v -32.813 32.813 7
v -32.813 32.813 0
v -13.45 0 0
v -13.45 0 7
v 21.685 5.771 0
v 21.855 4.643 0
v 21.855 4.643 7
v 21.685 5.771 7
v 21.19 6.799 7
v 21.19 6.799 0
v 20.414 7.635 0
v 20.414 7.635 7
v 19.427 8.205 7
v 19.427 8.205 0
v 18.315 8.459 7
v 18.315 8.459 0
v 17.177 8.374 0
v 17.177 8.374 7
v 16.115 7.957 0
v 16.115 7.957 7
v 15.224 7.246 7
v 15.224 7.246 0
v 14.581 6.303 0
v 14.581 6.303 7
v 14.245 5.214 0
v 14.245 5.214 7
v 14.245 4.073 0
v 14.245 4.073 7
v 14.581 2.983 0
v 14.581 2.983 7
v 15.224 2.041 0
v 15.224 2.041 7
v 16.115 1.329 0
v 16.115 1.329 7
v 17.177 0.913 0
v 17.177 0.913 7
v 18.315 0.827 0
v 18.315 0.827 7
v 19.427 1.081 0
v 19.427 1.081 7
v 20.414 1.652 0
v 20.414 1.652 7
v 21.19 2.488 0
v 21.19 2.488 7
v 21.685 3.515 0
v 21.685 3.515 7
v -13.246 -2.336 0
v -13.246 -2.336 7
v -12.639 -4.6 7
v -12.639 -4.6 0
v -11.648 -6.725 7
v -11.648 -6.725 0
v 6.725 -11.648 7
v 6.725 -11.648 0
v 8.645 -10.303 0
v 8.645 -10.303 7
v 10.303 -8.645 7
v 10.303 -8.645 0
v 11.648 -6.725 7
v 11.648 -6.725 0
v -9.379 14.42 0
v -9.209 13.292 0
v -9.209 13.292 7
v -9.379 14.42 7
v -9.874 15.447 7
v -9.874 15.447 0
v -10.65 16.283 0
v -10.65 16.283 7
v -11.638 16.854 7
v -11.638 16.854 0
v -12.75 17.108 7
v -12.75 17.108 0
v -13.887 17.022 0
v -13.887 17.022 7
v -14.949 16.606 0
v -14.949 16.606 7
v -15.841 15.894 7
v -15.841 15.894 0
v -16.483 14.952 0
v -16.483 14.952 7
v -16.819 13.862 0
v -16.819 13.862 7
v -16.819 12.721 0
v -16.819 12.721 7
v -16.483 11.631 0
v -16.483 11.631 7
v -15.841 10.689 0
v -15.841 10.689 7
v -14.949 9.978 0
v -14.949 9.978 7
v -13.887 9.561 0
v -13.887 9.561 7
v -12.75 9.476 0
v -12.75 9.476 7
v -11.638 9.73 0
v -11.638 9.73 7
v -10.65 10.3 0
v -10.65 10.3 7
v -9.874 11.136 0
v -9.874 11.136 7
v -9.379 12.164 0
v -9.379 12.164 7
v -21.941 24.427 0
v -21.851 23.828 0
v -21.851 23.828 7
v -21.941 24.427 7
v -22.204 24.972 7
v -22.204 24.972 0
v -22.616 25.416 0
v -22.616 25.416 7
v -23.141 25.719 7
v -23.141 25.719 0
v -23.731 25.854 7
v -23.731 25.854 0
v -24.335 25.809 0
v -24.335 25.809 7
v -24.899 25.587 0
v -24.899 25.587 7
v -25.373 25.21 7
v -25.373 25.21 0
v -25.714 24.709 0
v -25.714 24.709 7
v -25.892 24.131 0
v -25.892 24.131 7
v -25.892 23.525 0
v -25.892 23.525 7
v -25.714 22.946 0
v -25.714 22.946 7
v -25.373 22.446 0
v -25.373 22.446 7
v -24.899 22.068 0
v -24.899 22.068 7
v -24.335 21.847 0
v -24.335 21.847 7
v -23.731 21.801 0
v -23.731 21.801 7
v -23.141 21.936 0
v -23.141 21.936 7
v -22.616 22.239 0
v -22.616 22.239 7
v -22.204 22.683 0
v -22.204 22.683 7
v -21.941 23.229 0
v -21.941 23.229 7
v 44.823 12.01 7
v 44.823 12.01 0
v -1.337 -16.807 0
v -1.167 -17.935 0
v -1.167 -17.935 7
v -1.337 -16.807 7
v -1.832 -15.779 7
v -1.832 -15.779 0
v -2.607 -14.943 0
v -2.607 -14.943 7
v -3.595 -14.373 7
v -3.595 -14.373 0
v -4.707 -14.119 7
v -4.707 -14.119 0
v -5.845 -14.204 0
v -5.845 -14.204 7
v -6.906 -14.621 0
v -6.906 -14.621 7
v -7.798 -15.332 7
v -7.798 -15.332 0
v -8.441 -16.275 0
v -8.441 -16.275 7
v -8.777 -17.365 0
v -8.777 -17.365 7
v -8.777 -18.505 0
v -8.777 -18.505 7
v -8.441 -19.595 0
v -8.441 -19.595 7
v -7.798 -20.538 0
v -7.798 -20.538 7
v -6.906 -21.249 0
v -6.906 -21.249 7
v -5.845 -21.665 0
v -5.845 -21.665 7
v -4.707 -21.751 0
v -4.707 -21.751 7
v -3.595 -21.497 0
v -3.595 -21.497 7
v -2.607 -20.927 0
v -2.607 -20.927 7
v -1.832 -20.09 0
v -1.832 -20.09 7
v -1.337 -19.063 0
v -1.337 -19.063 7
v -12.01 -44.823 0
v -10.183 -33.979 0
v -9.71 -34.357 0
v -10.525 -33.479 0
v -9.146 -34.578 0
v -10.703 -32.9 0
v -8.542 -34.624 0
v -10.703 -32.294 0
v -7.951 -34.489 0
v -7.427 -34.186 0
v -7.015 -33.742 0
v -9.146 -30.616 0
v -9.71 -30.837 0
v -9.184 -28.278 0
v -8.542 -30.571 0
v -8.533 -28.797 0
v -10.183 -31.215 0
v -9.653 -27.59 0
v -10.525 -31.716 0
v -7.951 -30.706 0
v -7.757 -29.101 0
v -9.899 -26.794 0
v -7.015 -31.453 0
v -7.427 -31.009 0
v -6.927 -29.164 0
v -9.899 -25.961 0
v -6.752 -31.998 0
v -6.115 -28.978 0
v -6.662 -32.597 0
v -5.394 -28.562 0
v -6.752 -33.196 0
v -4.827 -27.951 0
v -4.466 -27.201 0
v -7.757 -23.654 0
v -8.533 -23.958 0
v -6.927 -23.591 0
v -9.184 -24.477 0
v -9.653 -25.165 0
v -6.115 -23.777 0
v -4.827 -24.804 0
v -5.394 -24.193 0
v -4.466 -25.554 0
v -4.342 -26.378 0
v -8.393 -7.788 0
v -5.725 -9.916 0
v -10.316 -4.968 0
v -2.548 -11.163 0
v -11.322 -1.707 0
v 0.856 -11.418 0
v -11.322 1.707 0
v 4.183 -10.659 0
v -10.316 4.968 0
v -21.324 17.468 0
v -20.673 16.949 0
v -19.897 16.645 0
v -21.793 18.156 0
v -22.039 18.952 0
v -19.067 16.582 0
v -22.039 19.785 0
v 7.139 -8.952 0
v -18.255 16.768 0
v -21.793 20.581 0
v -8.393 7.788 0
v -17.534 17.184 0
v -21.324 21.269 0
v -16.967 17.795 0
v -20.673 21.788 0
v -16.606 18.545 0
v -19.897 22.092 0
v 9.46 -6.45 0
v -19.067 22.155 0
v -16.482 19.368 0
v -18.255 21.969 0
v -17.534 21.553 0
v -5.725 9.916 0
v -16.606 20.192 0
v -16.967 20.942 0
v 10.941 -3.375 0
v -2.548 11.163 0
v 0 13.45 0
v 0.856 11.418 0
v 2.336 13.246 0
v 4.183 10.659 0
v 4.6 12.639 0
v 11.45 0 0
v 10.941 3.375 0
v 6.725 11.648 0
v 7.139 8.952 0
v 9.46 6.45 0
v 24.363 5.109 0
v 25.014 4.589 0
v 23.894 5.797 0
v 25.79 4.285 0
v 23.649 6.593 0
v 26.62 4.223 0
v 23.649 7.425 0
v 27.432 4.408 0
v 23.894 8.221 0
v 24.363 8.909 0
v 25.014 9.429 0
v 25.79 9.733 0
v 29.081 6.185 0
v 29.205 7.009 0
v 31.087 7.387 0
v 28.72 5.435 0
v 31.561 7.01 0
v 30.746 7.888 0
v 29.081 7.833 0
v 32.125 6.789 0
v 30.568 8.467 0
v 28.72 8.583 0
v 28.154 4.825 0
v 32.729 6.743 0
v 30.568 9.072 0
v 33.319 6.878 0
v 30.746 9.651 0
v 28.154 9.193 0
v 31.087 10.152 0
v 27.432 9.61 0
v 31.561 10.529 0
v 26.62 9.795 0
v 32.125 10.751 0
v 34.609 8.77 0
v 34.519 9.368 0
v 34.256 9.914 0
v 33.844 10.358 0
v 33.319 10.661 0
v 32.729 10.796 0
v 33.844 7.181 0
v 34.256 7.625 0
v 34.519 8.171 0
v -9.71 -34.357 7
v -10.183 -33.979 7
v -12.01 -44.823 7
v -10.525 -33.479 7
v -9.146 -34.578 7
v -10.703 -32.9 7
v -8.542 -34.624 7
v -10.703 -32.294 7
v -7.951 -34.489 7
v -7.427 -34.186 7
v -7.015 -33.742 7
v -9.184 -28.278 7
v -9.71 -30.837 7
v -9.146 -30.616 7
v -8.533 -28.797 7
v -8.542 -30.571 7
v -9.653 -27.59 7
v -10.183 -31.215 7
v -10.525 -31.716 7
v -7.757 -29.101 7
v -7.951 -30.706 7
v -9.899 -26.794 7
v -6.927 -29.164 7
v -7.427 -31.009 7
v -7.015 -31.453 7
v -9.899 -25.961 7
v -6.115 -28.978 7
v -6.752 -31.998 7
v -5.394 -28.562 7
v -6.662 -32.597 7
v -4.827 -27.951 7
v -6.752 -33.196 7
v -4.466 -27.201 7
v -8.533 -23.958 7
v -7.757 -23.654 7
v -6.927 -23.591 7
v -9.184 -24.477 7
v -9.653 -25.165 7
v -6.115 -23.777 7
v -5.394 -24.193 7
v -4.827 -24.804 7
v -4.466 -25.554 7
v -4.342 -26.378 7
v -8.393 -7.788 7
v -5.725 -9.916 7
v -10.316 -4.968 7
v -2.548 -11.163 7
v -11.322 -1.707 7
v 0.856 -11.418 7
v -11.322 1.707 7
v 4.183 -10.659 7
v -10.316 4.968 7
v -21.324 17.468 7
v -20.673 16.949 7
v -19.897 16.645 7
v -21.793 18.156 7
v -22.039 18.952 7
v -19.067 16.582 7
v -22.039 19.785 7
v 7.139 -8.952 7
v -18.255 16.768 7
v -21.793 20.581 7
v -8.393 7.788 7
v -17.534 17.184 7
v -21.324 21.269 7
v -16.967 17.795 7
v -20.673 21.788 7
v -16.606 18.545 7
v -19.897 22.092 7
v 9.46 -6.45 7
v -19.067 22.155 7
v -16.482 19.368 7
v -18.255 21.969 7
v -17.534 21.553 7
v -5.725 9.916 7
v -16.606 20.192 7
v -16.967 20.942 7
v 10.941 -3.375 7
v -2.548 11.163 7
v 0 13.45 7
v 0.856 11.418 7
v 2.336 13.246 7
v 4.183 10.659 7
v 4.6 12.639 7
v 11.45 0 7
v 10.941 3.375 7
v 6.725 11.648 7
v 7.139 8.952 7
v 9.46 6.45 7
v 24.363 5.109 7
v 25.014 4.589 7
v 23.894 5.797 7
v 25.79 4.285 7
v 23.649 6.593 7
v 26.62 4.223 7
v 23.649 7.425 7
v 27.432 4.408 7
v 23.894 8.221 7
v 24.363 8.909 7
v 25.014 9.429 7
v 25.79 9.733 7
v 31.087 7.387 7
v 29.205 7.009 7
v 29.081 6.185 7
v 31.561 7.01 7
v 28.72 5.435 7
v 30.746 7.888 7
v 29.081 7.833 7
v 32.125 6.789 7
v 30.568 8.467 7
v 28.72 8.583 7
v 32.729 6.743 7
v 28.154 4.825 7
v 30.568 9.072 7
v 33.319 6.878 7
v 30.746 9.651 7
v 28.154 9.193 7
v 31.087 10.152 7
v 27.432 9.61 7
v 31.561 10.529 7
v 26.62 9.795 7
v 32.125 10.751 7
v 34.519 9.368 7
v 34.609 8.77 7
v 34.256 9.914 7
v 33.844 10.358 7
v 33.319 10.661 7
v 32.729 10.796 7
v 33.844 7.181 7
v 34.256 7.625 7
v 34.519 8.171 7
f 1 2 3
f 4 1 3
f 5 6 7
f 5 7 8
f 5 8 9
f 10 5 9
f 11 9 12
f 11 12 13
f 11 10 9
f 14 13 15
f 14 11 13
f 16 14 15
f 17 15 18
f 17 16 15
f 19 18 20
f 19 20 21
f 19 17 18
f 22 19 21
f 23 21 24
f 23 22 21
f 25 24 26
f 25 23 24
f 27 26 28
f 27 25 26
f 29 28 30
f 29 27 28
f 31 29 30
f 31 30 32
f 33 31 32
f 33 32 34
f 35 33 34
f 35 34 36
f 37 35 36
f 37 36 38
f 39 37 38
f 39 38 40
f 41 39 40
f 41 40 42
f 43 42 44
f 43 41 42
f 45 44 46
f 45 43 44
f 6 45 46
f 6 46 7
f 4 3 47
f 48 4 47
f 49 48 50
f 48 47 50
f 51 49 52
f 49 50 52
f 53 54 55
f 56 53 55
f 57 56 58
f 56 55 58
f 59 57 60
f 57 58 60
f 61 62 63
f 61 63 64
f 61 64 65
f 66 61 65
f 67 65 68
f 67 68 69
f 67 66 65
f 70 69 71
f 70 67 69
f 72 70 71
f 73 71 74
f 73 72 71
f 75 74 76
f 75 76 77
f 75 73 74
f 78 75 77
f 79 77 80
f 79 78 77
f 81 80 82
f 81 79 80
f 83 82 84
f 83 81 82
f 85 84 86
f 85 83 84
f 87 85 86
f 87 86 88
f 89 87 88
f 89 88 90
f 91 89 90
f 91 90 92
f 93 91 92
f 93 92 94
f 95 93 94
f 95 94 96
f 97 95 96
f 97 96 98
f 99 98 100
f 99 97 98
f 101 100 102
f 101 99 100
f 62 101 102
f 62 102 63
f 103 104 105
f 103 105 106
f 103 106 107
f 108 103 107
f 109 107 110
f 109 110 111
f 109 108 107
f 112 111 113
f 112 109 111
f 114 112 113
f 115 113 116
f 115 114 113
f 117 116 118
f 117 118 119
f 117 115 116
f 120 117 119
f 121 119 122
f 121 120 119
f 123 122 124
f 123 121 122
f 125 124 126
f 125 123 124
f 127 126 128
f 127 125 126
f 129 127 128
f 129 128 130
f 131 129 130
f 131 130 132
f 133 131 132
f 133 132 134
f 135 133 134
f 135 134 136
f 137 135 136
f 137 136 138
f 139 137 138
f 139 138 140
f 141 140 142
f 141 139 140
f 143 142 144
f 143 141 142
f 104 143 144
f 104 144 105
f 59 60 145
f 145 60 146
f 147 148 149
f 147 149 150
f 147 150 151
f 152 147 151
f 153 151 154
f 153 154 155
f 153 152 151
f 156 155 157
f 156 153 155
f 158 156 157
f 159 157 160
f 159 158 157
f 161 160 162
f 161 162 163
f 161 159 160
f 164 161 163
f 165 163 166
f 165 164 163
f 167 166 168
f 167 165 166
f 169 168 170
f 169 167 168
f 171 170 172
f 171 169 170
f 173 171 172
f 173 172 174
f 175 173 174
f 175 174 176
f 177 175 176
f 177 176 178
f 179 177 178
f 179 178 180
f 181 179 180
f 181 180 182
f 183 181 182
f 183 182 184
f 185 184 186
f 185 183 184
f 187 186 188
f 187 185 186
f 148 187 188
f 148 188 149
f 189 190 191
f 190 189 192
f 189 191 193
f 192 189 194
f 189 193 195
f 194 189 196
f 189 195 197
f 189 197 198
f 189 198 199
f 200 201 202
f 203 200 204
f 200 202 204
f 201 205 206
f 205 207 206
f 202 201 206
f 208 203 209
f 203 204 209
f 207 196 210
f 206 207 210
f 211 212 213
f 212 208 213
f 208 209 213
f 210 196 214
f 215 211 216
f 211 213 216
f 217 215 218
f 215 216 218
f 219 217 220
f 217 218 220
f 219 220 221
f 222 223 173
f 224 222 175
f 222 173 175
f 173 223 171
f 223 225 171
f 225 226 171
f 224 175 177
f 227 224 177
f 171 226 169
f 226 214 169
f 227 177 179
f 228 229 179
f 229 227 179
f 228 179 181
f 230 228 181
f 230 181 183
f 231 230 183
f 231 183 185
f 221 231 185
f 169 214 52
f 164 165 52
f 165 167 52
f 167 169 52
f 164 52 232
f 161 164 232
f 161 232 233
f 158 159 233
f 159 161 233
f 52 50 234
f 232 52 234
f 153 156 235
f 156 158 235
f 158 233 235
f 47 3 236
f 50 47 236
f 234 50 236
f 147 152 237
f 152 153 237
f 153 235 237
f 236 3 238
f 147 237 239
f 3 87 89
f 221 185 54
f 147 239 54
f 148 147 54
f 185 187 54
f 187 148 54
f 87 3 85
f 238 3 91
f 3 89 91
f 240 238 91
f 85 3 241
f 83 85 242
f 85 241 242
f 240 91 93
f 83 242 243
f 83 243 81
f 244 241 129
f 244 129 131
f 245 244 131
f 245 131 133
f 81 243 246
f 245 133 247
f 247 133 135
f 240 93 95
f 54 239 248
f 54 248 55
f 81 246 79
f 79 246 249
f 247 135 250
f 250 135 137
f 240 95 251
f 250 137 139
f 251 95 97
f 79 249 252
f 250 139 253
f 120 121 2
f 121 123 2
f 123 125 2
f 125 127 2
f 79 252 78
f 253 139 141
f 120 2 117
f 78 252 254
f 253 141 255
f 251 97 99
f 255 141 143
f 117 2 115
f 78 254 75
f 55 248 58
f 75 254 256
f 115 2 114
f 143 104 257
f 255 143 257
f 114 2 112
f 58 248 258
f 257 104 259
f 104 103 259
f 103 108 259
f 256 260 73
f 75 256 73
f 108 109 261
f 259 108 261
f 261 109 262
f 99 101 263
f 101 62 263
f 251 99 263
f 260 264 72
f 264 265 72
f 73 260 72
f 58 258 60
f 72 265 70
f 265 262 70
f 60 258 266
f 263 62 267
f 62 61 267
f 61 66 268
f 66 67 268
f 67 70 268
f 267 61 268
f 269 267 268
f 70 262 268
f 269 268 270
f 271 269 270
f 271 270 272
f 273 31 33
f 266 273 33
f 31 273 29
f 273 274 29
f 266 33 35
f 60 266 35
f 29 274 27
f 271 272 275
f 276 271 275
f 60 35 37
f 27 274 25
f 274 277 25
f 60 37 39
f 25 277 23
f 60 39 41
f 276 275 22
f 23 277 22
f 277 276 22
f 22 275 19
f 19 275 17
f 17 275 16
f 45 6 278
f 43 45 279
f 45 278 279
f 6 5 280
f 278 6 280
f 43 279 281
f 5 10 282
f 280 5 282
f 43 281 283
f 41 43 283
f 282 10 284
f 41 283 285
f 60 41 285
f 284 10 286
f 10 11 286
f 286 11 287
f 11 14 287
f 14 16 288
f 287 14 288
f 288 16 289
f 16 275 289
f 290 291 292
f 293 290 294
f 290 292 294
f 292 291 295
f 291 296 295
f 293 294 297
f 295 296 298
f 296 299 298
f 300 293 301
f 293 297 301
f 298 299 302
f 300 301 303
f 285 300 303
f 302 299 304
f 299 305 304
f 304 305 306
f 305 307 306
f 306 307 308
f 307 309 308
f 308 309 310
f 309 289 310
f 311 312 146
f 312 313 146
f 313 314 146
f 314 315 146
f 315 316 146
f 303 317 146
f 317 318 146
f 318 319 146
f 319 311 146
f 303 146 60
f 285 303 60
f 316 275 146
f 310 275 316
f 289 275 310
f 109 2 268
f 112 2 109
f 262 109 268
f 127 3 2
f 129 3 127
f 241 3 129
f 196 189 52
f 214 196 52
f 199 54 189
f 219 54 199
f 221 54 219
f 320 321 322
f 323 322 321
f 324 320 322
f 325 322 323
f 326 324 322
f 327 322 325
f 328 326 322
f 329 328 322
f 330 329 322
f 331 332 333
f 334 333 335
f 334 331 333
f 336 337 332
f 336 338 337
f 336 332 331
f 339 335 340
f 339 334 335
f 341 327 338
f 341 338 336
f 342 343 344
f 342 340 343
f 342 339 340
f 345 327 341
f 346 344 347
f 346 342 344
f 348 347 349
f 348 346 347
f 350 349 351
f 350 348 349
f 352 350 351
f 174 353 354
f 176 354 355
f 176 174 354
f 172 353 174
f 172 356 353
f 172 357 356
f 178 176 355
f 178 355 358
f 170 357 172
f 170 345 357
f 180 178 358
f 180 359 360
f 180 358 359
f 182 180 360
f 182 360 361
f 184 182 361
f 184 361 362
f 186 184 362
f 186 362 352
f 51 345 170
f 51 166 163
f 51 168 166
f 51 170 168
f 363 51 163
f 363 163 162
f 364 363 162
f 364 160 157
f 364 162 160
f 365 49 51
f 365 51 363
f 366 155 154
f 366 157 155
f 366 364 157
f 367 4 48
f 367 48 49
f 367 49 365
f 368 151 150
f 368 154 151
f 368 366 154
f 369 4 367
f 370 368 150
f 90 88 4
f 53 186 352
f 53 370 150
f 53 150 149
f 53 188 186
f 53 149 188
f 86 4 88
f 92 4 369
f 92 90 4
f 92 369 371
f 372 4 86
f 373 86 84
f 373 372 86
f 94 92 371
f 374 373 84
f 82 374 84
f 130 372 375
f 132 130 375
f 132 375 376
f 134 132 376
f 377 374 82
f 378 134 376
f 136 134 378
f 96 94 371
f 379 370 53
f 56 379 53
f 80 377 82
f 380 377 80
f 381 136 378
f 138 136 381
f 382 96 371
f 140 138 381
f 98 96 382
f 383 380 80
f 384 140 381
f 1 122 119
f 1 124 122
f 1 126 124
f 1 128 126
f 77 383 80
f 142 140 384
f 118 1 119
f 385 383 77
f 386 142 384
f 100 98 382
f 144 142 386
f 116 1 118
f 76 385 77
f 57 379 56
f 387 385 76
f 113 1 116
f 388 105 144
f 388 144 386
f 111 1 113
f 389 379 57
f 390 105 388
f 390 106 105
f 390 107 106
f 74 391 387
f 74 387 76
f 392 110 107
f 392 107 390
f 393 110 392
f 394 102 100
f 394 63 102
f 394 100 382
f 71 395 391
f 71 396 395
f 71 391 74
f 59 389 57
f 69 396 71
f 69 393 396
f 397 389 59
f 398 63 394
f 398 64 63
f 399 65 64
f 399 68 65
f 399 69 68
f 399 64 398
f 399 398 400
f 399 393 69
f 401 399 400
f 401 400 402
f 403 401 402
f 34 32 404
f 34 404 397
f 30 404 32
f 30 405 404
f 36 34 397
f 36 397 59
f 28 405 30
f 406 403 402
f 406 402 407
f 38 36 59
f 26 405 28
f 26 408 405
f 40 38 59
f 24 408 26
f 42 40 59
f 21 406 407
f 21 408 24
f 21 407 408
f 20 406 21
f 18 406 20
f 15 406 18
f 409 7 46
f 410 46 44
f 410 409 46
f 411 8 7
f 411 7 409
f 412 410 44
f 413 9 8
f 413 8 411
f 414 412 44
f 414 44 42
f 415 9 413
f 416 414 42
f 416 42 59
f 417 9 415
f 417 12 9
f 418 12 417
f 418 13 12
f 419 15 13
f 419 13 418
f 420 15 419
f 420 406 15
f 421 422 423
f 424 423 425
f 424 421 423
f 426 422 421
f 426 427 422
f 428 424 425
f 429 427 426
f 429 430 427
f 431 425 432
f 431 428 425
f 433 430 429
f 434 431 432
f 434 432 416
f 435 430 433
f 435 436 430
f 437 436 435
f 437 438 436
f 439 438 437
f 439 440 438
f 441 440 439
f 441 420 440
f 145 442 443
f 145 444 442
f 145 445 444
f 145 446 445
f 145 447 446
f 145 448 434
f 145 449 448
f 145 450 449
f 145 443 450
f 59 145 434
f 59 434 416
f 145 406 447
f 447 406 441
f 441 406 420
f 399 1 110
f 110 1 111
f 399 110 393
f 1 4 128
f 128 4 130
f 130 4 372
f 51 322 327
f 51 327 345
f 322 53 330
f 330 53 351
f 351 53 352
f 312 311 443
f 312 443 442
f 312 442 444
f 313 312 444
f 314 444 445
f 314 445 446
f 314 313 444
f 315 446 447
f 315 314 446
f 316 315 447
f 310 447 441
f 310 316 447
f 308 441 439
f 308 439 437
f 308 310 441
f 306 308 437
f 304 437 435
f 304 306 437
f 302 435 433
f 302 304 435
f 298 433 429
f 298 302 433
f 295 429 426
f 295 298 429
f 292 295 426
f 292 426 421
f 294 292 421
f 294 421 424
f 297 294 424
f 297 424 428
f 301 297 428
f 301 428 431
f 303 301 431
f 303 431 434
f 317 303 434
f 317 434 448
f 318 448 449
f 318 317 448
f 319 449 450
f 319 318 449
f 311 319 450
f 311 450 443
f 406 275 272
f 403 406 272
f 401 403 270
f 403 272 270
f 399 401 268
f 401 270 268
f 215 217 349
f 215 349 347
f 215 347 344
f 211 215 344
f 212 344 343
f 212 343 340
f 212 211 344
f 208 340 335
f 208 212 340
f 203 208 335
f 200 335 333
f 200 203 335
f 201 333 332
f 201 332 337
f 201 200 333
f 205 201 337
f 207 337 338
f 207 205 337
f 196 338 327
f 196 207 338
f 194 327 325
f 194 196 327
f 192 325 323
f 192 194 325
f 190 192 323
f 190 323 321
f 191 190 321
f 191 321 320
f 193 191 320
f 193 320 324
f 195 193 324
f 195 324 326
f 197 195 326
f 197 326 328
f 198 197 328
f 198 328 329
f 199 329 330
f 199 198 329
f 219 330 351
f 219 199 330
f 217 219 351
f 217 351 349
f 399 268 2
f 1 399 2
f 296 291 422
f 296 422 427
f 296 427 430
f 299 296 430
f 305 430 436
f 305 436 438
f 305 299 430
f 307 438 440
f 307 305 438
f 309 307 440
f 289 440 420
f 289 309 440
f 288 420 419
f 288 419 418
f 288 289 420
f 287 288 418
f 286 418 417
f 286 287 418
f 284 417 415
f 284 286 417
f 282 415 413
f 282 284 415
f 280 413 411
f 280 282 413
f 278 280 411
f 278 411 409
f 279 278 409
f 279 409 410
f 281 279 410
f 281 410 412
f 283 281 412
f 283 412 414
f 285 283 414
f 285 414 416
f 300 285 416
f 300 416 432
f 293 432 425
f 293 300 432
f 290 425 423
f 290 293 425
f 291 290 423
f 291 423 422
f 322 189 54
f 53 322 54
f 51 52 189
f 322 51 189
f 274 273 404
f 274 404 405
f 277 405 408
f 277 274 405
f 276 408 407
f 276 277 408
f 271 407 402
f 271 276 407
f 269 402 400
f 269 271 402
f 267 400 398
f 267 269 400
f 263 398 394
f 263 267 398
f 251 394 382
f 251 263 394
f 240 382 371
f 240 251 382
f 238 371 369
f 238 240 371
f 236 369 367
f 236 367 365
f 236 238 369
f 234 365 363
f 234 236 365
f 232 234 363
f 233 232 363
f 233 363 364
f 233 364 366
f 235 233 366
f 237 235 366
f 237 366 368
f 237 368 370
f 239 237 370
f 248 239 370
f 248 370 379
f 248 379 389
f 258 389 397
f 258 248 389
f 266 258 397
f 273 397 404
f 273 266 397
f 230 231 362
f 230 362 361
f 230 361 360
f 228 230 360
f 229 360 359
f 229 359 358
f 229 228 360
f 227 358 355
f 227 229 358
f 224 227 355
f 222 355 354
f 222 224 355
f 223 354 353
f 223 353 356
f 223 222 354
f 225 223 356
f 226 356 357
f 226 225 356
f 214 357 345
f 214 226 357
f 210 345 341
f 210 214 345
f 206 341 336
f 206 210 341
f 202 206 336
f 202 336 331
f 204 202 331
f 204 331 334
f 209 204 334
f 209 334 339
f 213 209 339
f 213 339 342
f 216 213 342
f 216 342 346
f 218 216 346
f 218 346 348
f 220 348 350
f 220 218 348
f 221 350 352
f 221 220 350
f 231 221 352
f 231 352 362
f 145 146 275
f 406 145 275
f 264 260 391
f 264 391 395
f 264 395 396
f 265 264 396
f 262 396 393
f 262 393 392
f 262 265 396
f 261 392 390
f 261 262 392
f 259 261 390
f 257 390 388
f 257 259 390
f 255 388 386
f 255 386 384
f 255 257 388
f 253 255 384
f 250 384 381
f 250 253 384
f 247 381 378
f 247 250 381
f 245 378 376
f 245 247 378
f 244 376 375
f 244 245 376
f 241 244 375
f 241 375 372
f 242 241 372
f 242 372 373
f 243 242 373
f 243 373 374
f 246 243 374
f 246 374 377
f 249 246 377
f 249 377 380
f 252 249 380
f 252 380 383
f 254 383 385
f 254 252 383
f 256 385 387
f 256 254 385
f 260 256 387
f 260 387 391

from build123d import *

# Parameters (mm, degrees)
F0_R     = 11.45
F0_R_2   = 3.826519
F0_R_3   = 2.794
F0_R_4   = 2.032
F1_DEPTH = 7


with BuildPart() as f1:
    # F0 (on Top) → F1 (new body)
    with BuildSketch(Plane.XY):
        with BuildLine():
            ThreePointArc((11.648042, -6.725), (12.991702, -3.481116), (13.45, 0))
            ThreePointArc((13.45, 0), (11.648042, 6.725), (6.725, 11.648042))
            ThreePointArc((6.725, 11.648042), (3.481116, 12.991702), (0, 13.45))
            ThreePointArc((0, 13.45), (-9.510586, 9.510586), (-13.45, 0))
            ThreePointArc((-13.45, 0), (-12.991702, -3.481116), (-11.648042, -6.725))
            ThreePointArc((-11.648042, -6.725), (-3.481116, -12.991702), (6.725, -11.648042))
            ThreePointArc((6.725, -11.648042), (9.510586, -9.510586), (11.648042, -6.725))
        make_face()
        Circle(F0_R, mode=Mode.SUBTRACT)
        with BuildLine():
            ThreePointArc((6.725, 11.648042), (11.648042, 6.725), (13.45, 0))
            ThreePointArc((13.45, 0), (12.991702, -3.481116), (11.648042, -6.725))
            Line((11.648042, -6.725), (44.823277, 12.010361))
            Line((44.823277, 12.010361), (6.725, 11.648042))
        make_face()
        with Locations((18.028694, 4.64322)):
            Circle(F0_R_2, mode=Mode.SUBTRACT)
        with Locations((26.411475, 7.009044)):
            Circle(F0_R_3, mode=Mode.SUBTRACT)
        with Locations((32.576921, 8.769555)):
            Circle(F0_R_4, mode=Mode.SUBTRACT)
        with BuildLine():
            ThreePointArc((-13.45, 0), (-9.510586, 9.510586), (0, 13.45))
            Line((0, 13.45), (-32.812916, 32.812916))
            Line((-32.812916, 32.812916), (-13.45, 0))
        make_face()
        with Locations((-13.035493, 13.291697)):
            Circle(F0_R_2, mode=Mode.SUBTRACT)
        with Locations((-19.275748, 19.368486)):
            Circle(F0_R_3, mode=Mode.SUBTRACT)
        with Locations((-23.883118, 23.827664)):
            Circle(F0_R_4, mode=Mode.SUBTRACT)
        with BuildLine():
            Line((-12.010361, -44.823277), (6.725, -11.648042))
            ThreePointArc((6.725, -11.648042), (-3.481116, -12.991702), (-11.648042, -6.725))
            Line((-11.648042, -6.725), (-12.010361, -44.823277))
        make_face()
        with Locations((-8.693803, -32.597219)):
            Circle(F0_R_4, mode=Mode.SUBTRACT)
        with Locations((-7.135727, -26.37753)):
            Circle(F0_R_3, mode=Mode.SUBTRACT)
        with Locations((-4.993201, -17.934917)):
            Circle(F0_R_2, mode=Mode.SUBTRACT)
    extrude(amount=F1_DEPTH)


solid = f1.part
